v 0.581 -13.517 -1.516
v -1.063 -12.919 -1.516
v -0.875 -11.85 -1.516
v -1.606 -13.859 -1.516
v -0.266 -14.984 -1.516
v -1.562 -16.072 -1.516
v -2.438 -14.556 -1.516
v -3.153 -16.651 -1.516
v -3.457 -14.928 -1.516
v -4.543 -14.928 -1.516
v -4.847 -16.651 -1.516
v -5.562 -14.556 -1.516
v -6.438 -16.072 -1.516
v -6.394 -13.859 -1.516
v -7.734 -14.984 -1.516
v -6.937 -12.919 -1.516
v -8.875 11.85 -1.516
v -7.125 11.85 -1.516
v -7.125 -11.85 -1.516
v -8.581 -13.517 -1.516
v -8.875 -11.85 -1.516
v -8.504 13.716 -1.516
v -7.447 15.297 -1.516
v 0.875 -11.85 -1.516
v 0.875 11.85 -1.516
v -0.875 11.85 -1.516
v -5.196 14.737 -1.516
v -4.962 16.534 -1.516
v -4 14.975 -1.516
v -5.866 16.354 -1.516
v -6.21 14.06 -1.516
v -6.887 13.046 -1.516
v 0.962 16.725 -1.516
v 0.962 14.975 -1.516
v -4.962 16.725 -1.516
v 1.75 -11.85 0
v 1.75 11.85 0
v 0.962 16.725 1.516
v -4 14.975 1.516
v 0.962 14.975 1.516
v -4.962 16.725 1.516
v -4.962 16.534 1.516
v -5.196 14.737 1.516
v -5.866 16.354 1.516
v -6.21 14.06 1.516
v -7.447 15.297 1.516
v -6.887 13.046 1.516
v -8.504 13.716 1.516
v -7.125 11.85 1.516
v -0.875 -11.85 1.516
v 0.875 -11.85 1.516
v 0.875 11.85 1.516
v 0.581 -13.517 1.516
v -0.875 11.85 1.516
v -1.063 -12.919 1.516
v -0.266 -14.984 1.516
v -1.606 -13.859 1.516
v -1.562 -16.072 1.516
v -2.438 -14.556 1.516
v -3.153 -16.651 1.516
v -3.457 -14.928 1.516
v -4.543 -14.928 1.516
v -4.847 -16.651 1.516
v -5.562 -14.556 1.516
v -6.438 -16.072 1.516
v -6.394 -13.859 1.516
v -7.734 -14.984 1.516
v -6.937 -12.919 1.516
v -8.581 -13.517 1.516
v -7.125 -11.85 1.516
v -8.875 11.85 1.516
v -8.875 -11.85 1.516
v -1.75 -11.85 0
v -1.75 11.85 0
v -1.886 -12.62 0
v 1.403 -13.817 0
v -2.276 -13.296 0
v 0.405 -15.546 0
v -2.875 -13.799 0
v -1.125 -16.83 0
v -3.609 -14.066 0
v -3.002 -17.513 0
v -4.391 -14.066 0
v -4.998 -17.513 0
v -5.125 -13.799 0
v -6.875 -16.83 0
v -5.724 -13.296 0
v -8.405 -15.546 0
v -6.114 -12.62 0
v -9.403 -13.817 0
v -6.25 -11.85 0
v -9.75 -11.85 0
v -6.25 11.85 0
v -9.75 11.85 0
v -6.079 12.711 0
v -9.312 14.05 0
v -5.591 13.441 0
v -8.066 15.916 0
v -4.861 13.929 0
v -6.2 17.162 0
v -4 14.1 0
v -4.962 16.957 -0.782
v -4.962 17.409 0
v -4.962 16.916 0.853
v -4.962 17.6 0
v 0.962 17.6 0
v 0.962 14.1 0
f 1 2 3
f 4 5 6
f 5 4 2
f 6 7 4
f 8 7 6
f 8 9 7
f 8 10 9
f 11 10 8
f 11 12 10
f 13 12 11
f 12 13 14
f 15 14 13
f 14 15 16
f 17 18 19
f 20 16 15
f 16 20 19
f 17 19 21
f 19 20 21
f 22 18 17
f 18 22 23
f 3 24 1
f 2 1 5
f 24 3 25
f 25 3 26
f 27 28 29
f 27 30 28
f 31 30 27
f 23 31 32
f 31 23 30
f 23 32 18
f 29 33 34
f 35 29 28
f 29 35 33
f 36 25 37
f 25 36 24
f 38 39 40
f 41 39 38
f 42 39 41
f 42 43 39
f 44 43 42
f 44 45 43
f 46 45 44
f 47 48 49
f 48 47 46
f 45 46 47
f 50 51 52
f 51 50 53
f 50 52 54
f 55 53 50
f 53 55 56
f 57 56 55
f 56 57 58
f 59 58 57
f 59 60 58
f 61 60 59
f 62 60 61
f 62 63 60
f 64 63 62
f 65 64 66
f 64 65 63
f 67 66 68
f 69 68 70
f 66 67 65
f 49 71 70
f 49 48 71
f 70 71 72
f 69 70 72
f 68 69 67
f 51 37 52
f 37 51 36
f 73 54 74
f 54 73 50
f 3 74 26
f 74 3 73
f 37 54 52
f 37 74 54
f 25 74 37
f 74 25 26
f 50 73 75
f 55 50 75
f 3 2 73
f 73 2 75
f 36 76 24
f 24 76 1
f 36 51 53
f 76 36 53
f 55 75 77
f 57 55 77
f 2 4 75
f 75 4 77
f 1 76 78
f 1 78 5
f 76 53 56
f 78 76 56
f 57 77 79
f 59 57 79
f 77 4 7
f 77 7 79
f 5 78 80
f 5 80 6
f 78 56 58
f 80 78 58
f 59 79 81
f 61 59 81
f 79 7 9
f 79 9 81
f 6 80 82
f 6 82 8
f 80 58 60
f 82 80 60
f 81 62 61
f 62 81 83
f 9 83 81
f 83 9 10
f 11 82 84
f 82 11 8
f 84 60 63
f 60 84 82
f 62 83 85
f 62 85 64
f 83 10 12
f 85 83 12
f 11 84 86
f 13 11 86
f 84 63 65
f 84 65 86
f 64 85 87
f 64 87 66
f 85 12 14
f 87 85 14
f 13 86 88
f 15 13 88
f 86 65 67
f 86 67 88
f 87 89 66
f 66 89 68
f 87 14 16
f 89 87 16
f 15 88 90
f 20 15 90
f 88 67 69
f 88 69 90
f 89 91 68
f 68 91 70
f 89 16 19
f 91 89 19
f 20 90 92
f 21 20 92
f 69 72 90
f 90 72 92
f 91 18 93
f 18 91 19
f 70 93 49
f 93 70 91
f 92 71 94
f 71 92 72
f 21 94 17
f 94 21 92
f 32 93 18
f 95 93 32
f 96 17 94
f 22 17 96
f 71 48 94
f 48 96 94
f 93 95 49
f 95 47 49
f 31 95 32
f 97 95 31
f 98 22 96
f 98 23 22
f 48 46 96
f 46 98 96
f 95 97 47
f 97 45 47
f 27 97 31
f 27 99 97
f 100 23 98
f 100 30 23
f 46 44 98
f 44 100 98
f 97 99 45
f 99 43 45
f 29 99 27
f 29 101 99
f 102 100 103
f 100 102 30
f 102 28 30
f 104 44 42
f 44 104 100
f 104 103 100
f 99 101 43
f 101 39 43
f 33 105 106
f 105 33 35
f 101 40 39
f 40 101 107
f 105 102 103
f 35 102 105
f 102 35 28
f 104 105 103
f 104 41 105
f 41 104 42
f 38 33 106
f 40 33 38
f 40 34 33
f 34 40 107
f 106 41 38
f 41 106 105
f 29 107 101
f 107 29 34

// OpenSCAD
// file: lib.scad
module hull_box(l,w,h,c, center=true)
{	
    translate([center ? 0 : l/2, center ? 0 : w/2, center ? 0 : h/2]) 
	hull() {
        translate([-l/2+c, -w/2+c, -h/2+c]) sphere(r=c);
        translate([ l/2-c, -w/2+c, -h/2+c]) sphere(r=c);
        translate([ l/2-c,  w/2-c, -h/2+c]) sphere(r=c);
        translate([-l/2+c,  w/2-c, -h/2+c]) sphere(r=c);
        translate([-l/2+c, -w/2+c,  h/2-c]) sphere(r=c);
        translate([ l/2-c, -w/2+c,  h/2-c]) sphere(r=c);
        translate([ l/2-c,  w/2-c,  h/2-c]) sphere(r=c);
        translate([-l/2+c,  w/2-c,  h/2-c]) sphere(r=c);
    }
}

module wedge(l,w,h1,h2) {
    hull() {
        translate([0,(l-h1)/2,0])
            rotate([0,90,0]) cylinder(d=h1, h=w, center=true);
        translate([0,-l*0.45,0])
            cube([w,l*0.1,h2], center=true);
    }
}

module hinge_unit(p,d,l,w,h) {
    difference() {
        intersection() {
            cube([l,w,h], center=true);
            union() {
                translate([p,0,0]) rotate([90,0,0]) cylinder(d=(l/2-p)*2,h=2*w, center=true);
                translate([-l/2,-w,-h/2]) cube([l/2+p,w*2,h]);
            }
        }
        translate([p,0,0]) rotate([90,0,0]) cylinder(d=d,h=2*w, center=true);
    }
}

module hinge_n(p,d,l,w,h,j=0.2, n=1, base_h=0) {
    translate([0,(l-base_h)/2,0])
        cube([(2*n-1)*(w+j),base_h,h], center=true);
	translate([-(n-1)*(w+j),0,0]) for (i = [0 : n-1] ) {
		translate([ 2*i*(w+j), 0, 0]) rotate([0,0,270]) hinge_unit(p,d,l,w,h);
	}
}

module hinge_lock(hd,hl,e,j=0.2, endlock=true) {
    cylinder(d=hd-j, h=hl, center=true);
    translate([-e,0,hl/2]) rotate([90,0,0]) rotate_extrude(angle=180)
       translate([e, 0, 0]) circle(d=hd-j);
    translate([-2*e,0,0]) rotate([0,0,0]) cylinder(d=hd-j, h=hl, center=true);
    translate([-e,0,-hl/2]) rotate([90,0,0]) rotate_extrude(angle=90)
       translate([-e, 0, 0]) circle(d=hd-j);
	if (endlock) {
		translate([-e/2,0,-hl/2-hd]) rotate([0,90,0]) cylinder(d=hd-j, h=hl/4, center=true);
	}
}

module grip(l, d, f=1.2, t=0.5, dg=0, dh=1, dfl=1, center=true) {
    difference() {
        hull() {
            cylinder(h=l, d=d*f, center=center);
            if (dg != 0) {
                translate([dg + (t>0 ? 1 : -1) * (center ? d/2 : 0), 0, 0])
#                    cylinder(h=l*dfl, d=dh, center=center);
            }
        }
        cylinder(h=l*1.1, d=d, center=center);
        translate([d*f*t, 0, 0])
            cube([d*f,d*f,l*1.1], center=center);
    }
}

module angle_hold(a,r,l,t,d, f=1.2, dt=0.67, fl=1, dg=0, dh=1, dfl=1) {
    difference() {
        rotate_extrude(angle=a)
            translate([r, 0, 0]) square([l,t], center=true);
        rotate([90,0,90-0.5])
            translate([0,0,r]) cylinder(h=l*f, d=d*f, center=true);
        rotate([90,0,90+a+0.5])
            translate([0,0,r]) cylinder(h=l*f, d=d*f, center=true);
    }
    rotate([90,0,90])
        translate([0,0,r*0.995]) grip(l=l*fl, d=d, f=f, t=-dt, dg=dg, dh=dh, dfl=dfl);
    rotate([90,0,90+a])
        translate([0,0,r*0.995]) grip(l=l*fl, d=d, f=f, t=dt, dg=-dg, dh=dh, dfl=dfl);
}

module tube_lock(hinge_p, hinge_d, hinge_l, hinge_w, hinge_h, grip_l, grip_d, n=1, flat=true, f_grip=1.2) {
    difference() {
        union() {
            grip(grip_l, grip_d, f_grip);
            translate([flat?-hinge_w/2:0,-(hinge_l+grip_d)/2,0]) 
                rotate([0, flat?0:90, 0])
                    hinge_n(hinge_p,hinge_d,hinge_l,hinge_w,hinge_h, n=n);
            translate([flat?-hinge_w/2:0,(hinge_l+grip_d)/2,0]) rotate([0,0,180])
                rotate([0, flat?0:90, 0])
                    hinge_n(hinge_p,hinge_d,hinge_l,hinge_w,hinge_h, n=n);
        }
        if(!flat) {
            translate([grip_d/2,0,0])
                cube([grip_d,grip_d*f_grip,grip_l], center=true);
        }
    }
}

module sphere_hold(d,e,j,d1,a1,d2,a2) {
    difference() {
        sphere(d=d+e);
        sphere(d=d+j);
        rotate([0,a1,0]) translate([d1,0,0])
#            cube([d+e+j,d+e+j,d+e+j], center=true);
        rotate([0,a2,0]) translate([d2,0,0])
#            cube([d+e+j,d+e+j,d+e+j], center=true);
    }
}

module sphere_magnet_hold(d,e,c,j,d1,a1,d2,a2) {
    difference() {
        sphere_hold(d,e,j,d1,a1,d2,a2);
        translate([-(d+c)/2,0,0])
#            cube([c+j,c+j,c+j], center=true);
    }
}

module sphere_hinge_hold(d,e,j,d1,a1,d2,a2,hp,hd,hl,hw,hh,hn=3,ah=0,av=0) {
	sphere_hold(d,e,j,d1,a1,d2,a2);
	rotate([0,ah,0]) 
		translate([-(d+hl)*0.49,0,0]) 
			rotate([0,av,-90])
				hinge_n(hp,hd,hl,hw,hh, n=hn, base_h=e*1.5);
}
// main file
include<lib.scad>

n=5;
portee=6;
vis=4;
hinge_l=30;
hinge_w=3;
hinge_p=5;
hinge_h=12;
hinge_j=0.2;

rotate([90,0,0])
  hinge_lock(vis, (hinge_w*n+hinge_j*(n-1)) * 1.5, vis, 0.5);
